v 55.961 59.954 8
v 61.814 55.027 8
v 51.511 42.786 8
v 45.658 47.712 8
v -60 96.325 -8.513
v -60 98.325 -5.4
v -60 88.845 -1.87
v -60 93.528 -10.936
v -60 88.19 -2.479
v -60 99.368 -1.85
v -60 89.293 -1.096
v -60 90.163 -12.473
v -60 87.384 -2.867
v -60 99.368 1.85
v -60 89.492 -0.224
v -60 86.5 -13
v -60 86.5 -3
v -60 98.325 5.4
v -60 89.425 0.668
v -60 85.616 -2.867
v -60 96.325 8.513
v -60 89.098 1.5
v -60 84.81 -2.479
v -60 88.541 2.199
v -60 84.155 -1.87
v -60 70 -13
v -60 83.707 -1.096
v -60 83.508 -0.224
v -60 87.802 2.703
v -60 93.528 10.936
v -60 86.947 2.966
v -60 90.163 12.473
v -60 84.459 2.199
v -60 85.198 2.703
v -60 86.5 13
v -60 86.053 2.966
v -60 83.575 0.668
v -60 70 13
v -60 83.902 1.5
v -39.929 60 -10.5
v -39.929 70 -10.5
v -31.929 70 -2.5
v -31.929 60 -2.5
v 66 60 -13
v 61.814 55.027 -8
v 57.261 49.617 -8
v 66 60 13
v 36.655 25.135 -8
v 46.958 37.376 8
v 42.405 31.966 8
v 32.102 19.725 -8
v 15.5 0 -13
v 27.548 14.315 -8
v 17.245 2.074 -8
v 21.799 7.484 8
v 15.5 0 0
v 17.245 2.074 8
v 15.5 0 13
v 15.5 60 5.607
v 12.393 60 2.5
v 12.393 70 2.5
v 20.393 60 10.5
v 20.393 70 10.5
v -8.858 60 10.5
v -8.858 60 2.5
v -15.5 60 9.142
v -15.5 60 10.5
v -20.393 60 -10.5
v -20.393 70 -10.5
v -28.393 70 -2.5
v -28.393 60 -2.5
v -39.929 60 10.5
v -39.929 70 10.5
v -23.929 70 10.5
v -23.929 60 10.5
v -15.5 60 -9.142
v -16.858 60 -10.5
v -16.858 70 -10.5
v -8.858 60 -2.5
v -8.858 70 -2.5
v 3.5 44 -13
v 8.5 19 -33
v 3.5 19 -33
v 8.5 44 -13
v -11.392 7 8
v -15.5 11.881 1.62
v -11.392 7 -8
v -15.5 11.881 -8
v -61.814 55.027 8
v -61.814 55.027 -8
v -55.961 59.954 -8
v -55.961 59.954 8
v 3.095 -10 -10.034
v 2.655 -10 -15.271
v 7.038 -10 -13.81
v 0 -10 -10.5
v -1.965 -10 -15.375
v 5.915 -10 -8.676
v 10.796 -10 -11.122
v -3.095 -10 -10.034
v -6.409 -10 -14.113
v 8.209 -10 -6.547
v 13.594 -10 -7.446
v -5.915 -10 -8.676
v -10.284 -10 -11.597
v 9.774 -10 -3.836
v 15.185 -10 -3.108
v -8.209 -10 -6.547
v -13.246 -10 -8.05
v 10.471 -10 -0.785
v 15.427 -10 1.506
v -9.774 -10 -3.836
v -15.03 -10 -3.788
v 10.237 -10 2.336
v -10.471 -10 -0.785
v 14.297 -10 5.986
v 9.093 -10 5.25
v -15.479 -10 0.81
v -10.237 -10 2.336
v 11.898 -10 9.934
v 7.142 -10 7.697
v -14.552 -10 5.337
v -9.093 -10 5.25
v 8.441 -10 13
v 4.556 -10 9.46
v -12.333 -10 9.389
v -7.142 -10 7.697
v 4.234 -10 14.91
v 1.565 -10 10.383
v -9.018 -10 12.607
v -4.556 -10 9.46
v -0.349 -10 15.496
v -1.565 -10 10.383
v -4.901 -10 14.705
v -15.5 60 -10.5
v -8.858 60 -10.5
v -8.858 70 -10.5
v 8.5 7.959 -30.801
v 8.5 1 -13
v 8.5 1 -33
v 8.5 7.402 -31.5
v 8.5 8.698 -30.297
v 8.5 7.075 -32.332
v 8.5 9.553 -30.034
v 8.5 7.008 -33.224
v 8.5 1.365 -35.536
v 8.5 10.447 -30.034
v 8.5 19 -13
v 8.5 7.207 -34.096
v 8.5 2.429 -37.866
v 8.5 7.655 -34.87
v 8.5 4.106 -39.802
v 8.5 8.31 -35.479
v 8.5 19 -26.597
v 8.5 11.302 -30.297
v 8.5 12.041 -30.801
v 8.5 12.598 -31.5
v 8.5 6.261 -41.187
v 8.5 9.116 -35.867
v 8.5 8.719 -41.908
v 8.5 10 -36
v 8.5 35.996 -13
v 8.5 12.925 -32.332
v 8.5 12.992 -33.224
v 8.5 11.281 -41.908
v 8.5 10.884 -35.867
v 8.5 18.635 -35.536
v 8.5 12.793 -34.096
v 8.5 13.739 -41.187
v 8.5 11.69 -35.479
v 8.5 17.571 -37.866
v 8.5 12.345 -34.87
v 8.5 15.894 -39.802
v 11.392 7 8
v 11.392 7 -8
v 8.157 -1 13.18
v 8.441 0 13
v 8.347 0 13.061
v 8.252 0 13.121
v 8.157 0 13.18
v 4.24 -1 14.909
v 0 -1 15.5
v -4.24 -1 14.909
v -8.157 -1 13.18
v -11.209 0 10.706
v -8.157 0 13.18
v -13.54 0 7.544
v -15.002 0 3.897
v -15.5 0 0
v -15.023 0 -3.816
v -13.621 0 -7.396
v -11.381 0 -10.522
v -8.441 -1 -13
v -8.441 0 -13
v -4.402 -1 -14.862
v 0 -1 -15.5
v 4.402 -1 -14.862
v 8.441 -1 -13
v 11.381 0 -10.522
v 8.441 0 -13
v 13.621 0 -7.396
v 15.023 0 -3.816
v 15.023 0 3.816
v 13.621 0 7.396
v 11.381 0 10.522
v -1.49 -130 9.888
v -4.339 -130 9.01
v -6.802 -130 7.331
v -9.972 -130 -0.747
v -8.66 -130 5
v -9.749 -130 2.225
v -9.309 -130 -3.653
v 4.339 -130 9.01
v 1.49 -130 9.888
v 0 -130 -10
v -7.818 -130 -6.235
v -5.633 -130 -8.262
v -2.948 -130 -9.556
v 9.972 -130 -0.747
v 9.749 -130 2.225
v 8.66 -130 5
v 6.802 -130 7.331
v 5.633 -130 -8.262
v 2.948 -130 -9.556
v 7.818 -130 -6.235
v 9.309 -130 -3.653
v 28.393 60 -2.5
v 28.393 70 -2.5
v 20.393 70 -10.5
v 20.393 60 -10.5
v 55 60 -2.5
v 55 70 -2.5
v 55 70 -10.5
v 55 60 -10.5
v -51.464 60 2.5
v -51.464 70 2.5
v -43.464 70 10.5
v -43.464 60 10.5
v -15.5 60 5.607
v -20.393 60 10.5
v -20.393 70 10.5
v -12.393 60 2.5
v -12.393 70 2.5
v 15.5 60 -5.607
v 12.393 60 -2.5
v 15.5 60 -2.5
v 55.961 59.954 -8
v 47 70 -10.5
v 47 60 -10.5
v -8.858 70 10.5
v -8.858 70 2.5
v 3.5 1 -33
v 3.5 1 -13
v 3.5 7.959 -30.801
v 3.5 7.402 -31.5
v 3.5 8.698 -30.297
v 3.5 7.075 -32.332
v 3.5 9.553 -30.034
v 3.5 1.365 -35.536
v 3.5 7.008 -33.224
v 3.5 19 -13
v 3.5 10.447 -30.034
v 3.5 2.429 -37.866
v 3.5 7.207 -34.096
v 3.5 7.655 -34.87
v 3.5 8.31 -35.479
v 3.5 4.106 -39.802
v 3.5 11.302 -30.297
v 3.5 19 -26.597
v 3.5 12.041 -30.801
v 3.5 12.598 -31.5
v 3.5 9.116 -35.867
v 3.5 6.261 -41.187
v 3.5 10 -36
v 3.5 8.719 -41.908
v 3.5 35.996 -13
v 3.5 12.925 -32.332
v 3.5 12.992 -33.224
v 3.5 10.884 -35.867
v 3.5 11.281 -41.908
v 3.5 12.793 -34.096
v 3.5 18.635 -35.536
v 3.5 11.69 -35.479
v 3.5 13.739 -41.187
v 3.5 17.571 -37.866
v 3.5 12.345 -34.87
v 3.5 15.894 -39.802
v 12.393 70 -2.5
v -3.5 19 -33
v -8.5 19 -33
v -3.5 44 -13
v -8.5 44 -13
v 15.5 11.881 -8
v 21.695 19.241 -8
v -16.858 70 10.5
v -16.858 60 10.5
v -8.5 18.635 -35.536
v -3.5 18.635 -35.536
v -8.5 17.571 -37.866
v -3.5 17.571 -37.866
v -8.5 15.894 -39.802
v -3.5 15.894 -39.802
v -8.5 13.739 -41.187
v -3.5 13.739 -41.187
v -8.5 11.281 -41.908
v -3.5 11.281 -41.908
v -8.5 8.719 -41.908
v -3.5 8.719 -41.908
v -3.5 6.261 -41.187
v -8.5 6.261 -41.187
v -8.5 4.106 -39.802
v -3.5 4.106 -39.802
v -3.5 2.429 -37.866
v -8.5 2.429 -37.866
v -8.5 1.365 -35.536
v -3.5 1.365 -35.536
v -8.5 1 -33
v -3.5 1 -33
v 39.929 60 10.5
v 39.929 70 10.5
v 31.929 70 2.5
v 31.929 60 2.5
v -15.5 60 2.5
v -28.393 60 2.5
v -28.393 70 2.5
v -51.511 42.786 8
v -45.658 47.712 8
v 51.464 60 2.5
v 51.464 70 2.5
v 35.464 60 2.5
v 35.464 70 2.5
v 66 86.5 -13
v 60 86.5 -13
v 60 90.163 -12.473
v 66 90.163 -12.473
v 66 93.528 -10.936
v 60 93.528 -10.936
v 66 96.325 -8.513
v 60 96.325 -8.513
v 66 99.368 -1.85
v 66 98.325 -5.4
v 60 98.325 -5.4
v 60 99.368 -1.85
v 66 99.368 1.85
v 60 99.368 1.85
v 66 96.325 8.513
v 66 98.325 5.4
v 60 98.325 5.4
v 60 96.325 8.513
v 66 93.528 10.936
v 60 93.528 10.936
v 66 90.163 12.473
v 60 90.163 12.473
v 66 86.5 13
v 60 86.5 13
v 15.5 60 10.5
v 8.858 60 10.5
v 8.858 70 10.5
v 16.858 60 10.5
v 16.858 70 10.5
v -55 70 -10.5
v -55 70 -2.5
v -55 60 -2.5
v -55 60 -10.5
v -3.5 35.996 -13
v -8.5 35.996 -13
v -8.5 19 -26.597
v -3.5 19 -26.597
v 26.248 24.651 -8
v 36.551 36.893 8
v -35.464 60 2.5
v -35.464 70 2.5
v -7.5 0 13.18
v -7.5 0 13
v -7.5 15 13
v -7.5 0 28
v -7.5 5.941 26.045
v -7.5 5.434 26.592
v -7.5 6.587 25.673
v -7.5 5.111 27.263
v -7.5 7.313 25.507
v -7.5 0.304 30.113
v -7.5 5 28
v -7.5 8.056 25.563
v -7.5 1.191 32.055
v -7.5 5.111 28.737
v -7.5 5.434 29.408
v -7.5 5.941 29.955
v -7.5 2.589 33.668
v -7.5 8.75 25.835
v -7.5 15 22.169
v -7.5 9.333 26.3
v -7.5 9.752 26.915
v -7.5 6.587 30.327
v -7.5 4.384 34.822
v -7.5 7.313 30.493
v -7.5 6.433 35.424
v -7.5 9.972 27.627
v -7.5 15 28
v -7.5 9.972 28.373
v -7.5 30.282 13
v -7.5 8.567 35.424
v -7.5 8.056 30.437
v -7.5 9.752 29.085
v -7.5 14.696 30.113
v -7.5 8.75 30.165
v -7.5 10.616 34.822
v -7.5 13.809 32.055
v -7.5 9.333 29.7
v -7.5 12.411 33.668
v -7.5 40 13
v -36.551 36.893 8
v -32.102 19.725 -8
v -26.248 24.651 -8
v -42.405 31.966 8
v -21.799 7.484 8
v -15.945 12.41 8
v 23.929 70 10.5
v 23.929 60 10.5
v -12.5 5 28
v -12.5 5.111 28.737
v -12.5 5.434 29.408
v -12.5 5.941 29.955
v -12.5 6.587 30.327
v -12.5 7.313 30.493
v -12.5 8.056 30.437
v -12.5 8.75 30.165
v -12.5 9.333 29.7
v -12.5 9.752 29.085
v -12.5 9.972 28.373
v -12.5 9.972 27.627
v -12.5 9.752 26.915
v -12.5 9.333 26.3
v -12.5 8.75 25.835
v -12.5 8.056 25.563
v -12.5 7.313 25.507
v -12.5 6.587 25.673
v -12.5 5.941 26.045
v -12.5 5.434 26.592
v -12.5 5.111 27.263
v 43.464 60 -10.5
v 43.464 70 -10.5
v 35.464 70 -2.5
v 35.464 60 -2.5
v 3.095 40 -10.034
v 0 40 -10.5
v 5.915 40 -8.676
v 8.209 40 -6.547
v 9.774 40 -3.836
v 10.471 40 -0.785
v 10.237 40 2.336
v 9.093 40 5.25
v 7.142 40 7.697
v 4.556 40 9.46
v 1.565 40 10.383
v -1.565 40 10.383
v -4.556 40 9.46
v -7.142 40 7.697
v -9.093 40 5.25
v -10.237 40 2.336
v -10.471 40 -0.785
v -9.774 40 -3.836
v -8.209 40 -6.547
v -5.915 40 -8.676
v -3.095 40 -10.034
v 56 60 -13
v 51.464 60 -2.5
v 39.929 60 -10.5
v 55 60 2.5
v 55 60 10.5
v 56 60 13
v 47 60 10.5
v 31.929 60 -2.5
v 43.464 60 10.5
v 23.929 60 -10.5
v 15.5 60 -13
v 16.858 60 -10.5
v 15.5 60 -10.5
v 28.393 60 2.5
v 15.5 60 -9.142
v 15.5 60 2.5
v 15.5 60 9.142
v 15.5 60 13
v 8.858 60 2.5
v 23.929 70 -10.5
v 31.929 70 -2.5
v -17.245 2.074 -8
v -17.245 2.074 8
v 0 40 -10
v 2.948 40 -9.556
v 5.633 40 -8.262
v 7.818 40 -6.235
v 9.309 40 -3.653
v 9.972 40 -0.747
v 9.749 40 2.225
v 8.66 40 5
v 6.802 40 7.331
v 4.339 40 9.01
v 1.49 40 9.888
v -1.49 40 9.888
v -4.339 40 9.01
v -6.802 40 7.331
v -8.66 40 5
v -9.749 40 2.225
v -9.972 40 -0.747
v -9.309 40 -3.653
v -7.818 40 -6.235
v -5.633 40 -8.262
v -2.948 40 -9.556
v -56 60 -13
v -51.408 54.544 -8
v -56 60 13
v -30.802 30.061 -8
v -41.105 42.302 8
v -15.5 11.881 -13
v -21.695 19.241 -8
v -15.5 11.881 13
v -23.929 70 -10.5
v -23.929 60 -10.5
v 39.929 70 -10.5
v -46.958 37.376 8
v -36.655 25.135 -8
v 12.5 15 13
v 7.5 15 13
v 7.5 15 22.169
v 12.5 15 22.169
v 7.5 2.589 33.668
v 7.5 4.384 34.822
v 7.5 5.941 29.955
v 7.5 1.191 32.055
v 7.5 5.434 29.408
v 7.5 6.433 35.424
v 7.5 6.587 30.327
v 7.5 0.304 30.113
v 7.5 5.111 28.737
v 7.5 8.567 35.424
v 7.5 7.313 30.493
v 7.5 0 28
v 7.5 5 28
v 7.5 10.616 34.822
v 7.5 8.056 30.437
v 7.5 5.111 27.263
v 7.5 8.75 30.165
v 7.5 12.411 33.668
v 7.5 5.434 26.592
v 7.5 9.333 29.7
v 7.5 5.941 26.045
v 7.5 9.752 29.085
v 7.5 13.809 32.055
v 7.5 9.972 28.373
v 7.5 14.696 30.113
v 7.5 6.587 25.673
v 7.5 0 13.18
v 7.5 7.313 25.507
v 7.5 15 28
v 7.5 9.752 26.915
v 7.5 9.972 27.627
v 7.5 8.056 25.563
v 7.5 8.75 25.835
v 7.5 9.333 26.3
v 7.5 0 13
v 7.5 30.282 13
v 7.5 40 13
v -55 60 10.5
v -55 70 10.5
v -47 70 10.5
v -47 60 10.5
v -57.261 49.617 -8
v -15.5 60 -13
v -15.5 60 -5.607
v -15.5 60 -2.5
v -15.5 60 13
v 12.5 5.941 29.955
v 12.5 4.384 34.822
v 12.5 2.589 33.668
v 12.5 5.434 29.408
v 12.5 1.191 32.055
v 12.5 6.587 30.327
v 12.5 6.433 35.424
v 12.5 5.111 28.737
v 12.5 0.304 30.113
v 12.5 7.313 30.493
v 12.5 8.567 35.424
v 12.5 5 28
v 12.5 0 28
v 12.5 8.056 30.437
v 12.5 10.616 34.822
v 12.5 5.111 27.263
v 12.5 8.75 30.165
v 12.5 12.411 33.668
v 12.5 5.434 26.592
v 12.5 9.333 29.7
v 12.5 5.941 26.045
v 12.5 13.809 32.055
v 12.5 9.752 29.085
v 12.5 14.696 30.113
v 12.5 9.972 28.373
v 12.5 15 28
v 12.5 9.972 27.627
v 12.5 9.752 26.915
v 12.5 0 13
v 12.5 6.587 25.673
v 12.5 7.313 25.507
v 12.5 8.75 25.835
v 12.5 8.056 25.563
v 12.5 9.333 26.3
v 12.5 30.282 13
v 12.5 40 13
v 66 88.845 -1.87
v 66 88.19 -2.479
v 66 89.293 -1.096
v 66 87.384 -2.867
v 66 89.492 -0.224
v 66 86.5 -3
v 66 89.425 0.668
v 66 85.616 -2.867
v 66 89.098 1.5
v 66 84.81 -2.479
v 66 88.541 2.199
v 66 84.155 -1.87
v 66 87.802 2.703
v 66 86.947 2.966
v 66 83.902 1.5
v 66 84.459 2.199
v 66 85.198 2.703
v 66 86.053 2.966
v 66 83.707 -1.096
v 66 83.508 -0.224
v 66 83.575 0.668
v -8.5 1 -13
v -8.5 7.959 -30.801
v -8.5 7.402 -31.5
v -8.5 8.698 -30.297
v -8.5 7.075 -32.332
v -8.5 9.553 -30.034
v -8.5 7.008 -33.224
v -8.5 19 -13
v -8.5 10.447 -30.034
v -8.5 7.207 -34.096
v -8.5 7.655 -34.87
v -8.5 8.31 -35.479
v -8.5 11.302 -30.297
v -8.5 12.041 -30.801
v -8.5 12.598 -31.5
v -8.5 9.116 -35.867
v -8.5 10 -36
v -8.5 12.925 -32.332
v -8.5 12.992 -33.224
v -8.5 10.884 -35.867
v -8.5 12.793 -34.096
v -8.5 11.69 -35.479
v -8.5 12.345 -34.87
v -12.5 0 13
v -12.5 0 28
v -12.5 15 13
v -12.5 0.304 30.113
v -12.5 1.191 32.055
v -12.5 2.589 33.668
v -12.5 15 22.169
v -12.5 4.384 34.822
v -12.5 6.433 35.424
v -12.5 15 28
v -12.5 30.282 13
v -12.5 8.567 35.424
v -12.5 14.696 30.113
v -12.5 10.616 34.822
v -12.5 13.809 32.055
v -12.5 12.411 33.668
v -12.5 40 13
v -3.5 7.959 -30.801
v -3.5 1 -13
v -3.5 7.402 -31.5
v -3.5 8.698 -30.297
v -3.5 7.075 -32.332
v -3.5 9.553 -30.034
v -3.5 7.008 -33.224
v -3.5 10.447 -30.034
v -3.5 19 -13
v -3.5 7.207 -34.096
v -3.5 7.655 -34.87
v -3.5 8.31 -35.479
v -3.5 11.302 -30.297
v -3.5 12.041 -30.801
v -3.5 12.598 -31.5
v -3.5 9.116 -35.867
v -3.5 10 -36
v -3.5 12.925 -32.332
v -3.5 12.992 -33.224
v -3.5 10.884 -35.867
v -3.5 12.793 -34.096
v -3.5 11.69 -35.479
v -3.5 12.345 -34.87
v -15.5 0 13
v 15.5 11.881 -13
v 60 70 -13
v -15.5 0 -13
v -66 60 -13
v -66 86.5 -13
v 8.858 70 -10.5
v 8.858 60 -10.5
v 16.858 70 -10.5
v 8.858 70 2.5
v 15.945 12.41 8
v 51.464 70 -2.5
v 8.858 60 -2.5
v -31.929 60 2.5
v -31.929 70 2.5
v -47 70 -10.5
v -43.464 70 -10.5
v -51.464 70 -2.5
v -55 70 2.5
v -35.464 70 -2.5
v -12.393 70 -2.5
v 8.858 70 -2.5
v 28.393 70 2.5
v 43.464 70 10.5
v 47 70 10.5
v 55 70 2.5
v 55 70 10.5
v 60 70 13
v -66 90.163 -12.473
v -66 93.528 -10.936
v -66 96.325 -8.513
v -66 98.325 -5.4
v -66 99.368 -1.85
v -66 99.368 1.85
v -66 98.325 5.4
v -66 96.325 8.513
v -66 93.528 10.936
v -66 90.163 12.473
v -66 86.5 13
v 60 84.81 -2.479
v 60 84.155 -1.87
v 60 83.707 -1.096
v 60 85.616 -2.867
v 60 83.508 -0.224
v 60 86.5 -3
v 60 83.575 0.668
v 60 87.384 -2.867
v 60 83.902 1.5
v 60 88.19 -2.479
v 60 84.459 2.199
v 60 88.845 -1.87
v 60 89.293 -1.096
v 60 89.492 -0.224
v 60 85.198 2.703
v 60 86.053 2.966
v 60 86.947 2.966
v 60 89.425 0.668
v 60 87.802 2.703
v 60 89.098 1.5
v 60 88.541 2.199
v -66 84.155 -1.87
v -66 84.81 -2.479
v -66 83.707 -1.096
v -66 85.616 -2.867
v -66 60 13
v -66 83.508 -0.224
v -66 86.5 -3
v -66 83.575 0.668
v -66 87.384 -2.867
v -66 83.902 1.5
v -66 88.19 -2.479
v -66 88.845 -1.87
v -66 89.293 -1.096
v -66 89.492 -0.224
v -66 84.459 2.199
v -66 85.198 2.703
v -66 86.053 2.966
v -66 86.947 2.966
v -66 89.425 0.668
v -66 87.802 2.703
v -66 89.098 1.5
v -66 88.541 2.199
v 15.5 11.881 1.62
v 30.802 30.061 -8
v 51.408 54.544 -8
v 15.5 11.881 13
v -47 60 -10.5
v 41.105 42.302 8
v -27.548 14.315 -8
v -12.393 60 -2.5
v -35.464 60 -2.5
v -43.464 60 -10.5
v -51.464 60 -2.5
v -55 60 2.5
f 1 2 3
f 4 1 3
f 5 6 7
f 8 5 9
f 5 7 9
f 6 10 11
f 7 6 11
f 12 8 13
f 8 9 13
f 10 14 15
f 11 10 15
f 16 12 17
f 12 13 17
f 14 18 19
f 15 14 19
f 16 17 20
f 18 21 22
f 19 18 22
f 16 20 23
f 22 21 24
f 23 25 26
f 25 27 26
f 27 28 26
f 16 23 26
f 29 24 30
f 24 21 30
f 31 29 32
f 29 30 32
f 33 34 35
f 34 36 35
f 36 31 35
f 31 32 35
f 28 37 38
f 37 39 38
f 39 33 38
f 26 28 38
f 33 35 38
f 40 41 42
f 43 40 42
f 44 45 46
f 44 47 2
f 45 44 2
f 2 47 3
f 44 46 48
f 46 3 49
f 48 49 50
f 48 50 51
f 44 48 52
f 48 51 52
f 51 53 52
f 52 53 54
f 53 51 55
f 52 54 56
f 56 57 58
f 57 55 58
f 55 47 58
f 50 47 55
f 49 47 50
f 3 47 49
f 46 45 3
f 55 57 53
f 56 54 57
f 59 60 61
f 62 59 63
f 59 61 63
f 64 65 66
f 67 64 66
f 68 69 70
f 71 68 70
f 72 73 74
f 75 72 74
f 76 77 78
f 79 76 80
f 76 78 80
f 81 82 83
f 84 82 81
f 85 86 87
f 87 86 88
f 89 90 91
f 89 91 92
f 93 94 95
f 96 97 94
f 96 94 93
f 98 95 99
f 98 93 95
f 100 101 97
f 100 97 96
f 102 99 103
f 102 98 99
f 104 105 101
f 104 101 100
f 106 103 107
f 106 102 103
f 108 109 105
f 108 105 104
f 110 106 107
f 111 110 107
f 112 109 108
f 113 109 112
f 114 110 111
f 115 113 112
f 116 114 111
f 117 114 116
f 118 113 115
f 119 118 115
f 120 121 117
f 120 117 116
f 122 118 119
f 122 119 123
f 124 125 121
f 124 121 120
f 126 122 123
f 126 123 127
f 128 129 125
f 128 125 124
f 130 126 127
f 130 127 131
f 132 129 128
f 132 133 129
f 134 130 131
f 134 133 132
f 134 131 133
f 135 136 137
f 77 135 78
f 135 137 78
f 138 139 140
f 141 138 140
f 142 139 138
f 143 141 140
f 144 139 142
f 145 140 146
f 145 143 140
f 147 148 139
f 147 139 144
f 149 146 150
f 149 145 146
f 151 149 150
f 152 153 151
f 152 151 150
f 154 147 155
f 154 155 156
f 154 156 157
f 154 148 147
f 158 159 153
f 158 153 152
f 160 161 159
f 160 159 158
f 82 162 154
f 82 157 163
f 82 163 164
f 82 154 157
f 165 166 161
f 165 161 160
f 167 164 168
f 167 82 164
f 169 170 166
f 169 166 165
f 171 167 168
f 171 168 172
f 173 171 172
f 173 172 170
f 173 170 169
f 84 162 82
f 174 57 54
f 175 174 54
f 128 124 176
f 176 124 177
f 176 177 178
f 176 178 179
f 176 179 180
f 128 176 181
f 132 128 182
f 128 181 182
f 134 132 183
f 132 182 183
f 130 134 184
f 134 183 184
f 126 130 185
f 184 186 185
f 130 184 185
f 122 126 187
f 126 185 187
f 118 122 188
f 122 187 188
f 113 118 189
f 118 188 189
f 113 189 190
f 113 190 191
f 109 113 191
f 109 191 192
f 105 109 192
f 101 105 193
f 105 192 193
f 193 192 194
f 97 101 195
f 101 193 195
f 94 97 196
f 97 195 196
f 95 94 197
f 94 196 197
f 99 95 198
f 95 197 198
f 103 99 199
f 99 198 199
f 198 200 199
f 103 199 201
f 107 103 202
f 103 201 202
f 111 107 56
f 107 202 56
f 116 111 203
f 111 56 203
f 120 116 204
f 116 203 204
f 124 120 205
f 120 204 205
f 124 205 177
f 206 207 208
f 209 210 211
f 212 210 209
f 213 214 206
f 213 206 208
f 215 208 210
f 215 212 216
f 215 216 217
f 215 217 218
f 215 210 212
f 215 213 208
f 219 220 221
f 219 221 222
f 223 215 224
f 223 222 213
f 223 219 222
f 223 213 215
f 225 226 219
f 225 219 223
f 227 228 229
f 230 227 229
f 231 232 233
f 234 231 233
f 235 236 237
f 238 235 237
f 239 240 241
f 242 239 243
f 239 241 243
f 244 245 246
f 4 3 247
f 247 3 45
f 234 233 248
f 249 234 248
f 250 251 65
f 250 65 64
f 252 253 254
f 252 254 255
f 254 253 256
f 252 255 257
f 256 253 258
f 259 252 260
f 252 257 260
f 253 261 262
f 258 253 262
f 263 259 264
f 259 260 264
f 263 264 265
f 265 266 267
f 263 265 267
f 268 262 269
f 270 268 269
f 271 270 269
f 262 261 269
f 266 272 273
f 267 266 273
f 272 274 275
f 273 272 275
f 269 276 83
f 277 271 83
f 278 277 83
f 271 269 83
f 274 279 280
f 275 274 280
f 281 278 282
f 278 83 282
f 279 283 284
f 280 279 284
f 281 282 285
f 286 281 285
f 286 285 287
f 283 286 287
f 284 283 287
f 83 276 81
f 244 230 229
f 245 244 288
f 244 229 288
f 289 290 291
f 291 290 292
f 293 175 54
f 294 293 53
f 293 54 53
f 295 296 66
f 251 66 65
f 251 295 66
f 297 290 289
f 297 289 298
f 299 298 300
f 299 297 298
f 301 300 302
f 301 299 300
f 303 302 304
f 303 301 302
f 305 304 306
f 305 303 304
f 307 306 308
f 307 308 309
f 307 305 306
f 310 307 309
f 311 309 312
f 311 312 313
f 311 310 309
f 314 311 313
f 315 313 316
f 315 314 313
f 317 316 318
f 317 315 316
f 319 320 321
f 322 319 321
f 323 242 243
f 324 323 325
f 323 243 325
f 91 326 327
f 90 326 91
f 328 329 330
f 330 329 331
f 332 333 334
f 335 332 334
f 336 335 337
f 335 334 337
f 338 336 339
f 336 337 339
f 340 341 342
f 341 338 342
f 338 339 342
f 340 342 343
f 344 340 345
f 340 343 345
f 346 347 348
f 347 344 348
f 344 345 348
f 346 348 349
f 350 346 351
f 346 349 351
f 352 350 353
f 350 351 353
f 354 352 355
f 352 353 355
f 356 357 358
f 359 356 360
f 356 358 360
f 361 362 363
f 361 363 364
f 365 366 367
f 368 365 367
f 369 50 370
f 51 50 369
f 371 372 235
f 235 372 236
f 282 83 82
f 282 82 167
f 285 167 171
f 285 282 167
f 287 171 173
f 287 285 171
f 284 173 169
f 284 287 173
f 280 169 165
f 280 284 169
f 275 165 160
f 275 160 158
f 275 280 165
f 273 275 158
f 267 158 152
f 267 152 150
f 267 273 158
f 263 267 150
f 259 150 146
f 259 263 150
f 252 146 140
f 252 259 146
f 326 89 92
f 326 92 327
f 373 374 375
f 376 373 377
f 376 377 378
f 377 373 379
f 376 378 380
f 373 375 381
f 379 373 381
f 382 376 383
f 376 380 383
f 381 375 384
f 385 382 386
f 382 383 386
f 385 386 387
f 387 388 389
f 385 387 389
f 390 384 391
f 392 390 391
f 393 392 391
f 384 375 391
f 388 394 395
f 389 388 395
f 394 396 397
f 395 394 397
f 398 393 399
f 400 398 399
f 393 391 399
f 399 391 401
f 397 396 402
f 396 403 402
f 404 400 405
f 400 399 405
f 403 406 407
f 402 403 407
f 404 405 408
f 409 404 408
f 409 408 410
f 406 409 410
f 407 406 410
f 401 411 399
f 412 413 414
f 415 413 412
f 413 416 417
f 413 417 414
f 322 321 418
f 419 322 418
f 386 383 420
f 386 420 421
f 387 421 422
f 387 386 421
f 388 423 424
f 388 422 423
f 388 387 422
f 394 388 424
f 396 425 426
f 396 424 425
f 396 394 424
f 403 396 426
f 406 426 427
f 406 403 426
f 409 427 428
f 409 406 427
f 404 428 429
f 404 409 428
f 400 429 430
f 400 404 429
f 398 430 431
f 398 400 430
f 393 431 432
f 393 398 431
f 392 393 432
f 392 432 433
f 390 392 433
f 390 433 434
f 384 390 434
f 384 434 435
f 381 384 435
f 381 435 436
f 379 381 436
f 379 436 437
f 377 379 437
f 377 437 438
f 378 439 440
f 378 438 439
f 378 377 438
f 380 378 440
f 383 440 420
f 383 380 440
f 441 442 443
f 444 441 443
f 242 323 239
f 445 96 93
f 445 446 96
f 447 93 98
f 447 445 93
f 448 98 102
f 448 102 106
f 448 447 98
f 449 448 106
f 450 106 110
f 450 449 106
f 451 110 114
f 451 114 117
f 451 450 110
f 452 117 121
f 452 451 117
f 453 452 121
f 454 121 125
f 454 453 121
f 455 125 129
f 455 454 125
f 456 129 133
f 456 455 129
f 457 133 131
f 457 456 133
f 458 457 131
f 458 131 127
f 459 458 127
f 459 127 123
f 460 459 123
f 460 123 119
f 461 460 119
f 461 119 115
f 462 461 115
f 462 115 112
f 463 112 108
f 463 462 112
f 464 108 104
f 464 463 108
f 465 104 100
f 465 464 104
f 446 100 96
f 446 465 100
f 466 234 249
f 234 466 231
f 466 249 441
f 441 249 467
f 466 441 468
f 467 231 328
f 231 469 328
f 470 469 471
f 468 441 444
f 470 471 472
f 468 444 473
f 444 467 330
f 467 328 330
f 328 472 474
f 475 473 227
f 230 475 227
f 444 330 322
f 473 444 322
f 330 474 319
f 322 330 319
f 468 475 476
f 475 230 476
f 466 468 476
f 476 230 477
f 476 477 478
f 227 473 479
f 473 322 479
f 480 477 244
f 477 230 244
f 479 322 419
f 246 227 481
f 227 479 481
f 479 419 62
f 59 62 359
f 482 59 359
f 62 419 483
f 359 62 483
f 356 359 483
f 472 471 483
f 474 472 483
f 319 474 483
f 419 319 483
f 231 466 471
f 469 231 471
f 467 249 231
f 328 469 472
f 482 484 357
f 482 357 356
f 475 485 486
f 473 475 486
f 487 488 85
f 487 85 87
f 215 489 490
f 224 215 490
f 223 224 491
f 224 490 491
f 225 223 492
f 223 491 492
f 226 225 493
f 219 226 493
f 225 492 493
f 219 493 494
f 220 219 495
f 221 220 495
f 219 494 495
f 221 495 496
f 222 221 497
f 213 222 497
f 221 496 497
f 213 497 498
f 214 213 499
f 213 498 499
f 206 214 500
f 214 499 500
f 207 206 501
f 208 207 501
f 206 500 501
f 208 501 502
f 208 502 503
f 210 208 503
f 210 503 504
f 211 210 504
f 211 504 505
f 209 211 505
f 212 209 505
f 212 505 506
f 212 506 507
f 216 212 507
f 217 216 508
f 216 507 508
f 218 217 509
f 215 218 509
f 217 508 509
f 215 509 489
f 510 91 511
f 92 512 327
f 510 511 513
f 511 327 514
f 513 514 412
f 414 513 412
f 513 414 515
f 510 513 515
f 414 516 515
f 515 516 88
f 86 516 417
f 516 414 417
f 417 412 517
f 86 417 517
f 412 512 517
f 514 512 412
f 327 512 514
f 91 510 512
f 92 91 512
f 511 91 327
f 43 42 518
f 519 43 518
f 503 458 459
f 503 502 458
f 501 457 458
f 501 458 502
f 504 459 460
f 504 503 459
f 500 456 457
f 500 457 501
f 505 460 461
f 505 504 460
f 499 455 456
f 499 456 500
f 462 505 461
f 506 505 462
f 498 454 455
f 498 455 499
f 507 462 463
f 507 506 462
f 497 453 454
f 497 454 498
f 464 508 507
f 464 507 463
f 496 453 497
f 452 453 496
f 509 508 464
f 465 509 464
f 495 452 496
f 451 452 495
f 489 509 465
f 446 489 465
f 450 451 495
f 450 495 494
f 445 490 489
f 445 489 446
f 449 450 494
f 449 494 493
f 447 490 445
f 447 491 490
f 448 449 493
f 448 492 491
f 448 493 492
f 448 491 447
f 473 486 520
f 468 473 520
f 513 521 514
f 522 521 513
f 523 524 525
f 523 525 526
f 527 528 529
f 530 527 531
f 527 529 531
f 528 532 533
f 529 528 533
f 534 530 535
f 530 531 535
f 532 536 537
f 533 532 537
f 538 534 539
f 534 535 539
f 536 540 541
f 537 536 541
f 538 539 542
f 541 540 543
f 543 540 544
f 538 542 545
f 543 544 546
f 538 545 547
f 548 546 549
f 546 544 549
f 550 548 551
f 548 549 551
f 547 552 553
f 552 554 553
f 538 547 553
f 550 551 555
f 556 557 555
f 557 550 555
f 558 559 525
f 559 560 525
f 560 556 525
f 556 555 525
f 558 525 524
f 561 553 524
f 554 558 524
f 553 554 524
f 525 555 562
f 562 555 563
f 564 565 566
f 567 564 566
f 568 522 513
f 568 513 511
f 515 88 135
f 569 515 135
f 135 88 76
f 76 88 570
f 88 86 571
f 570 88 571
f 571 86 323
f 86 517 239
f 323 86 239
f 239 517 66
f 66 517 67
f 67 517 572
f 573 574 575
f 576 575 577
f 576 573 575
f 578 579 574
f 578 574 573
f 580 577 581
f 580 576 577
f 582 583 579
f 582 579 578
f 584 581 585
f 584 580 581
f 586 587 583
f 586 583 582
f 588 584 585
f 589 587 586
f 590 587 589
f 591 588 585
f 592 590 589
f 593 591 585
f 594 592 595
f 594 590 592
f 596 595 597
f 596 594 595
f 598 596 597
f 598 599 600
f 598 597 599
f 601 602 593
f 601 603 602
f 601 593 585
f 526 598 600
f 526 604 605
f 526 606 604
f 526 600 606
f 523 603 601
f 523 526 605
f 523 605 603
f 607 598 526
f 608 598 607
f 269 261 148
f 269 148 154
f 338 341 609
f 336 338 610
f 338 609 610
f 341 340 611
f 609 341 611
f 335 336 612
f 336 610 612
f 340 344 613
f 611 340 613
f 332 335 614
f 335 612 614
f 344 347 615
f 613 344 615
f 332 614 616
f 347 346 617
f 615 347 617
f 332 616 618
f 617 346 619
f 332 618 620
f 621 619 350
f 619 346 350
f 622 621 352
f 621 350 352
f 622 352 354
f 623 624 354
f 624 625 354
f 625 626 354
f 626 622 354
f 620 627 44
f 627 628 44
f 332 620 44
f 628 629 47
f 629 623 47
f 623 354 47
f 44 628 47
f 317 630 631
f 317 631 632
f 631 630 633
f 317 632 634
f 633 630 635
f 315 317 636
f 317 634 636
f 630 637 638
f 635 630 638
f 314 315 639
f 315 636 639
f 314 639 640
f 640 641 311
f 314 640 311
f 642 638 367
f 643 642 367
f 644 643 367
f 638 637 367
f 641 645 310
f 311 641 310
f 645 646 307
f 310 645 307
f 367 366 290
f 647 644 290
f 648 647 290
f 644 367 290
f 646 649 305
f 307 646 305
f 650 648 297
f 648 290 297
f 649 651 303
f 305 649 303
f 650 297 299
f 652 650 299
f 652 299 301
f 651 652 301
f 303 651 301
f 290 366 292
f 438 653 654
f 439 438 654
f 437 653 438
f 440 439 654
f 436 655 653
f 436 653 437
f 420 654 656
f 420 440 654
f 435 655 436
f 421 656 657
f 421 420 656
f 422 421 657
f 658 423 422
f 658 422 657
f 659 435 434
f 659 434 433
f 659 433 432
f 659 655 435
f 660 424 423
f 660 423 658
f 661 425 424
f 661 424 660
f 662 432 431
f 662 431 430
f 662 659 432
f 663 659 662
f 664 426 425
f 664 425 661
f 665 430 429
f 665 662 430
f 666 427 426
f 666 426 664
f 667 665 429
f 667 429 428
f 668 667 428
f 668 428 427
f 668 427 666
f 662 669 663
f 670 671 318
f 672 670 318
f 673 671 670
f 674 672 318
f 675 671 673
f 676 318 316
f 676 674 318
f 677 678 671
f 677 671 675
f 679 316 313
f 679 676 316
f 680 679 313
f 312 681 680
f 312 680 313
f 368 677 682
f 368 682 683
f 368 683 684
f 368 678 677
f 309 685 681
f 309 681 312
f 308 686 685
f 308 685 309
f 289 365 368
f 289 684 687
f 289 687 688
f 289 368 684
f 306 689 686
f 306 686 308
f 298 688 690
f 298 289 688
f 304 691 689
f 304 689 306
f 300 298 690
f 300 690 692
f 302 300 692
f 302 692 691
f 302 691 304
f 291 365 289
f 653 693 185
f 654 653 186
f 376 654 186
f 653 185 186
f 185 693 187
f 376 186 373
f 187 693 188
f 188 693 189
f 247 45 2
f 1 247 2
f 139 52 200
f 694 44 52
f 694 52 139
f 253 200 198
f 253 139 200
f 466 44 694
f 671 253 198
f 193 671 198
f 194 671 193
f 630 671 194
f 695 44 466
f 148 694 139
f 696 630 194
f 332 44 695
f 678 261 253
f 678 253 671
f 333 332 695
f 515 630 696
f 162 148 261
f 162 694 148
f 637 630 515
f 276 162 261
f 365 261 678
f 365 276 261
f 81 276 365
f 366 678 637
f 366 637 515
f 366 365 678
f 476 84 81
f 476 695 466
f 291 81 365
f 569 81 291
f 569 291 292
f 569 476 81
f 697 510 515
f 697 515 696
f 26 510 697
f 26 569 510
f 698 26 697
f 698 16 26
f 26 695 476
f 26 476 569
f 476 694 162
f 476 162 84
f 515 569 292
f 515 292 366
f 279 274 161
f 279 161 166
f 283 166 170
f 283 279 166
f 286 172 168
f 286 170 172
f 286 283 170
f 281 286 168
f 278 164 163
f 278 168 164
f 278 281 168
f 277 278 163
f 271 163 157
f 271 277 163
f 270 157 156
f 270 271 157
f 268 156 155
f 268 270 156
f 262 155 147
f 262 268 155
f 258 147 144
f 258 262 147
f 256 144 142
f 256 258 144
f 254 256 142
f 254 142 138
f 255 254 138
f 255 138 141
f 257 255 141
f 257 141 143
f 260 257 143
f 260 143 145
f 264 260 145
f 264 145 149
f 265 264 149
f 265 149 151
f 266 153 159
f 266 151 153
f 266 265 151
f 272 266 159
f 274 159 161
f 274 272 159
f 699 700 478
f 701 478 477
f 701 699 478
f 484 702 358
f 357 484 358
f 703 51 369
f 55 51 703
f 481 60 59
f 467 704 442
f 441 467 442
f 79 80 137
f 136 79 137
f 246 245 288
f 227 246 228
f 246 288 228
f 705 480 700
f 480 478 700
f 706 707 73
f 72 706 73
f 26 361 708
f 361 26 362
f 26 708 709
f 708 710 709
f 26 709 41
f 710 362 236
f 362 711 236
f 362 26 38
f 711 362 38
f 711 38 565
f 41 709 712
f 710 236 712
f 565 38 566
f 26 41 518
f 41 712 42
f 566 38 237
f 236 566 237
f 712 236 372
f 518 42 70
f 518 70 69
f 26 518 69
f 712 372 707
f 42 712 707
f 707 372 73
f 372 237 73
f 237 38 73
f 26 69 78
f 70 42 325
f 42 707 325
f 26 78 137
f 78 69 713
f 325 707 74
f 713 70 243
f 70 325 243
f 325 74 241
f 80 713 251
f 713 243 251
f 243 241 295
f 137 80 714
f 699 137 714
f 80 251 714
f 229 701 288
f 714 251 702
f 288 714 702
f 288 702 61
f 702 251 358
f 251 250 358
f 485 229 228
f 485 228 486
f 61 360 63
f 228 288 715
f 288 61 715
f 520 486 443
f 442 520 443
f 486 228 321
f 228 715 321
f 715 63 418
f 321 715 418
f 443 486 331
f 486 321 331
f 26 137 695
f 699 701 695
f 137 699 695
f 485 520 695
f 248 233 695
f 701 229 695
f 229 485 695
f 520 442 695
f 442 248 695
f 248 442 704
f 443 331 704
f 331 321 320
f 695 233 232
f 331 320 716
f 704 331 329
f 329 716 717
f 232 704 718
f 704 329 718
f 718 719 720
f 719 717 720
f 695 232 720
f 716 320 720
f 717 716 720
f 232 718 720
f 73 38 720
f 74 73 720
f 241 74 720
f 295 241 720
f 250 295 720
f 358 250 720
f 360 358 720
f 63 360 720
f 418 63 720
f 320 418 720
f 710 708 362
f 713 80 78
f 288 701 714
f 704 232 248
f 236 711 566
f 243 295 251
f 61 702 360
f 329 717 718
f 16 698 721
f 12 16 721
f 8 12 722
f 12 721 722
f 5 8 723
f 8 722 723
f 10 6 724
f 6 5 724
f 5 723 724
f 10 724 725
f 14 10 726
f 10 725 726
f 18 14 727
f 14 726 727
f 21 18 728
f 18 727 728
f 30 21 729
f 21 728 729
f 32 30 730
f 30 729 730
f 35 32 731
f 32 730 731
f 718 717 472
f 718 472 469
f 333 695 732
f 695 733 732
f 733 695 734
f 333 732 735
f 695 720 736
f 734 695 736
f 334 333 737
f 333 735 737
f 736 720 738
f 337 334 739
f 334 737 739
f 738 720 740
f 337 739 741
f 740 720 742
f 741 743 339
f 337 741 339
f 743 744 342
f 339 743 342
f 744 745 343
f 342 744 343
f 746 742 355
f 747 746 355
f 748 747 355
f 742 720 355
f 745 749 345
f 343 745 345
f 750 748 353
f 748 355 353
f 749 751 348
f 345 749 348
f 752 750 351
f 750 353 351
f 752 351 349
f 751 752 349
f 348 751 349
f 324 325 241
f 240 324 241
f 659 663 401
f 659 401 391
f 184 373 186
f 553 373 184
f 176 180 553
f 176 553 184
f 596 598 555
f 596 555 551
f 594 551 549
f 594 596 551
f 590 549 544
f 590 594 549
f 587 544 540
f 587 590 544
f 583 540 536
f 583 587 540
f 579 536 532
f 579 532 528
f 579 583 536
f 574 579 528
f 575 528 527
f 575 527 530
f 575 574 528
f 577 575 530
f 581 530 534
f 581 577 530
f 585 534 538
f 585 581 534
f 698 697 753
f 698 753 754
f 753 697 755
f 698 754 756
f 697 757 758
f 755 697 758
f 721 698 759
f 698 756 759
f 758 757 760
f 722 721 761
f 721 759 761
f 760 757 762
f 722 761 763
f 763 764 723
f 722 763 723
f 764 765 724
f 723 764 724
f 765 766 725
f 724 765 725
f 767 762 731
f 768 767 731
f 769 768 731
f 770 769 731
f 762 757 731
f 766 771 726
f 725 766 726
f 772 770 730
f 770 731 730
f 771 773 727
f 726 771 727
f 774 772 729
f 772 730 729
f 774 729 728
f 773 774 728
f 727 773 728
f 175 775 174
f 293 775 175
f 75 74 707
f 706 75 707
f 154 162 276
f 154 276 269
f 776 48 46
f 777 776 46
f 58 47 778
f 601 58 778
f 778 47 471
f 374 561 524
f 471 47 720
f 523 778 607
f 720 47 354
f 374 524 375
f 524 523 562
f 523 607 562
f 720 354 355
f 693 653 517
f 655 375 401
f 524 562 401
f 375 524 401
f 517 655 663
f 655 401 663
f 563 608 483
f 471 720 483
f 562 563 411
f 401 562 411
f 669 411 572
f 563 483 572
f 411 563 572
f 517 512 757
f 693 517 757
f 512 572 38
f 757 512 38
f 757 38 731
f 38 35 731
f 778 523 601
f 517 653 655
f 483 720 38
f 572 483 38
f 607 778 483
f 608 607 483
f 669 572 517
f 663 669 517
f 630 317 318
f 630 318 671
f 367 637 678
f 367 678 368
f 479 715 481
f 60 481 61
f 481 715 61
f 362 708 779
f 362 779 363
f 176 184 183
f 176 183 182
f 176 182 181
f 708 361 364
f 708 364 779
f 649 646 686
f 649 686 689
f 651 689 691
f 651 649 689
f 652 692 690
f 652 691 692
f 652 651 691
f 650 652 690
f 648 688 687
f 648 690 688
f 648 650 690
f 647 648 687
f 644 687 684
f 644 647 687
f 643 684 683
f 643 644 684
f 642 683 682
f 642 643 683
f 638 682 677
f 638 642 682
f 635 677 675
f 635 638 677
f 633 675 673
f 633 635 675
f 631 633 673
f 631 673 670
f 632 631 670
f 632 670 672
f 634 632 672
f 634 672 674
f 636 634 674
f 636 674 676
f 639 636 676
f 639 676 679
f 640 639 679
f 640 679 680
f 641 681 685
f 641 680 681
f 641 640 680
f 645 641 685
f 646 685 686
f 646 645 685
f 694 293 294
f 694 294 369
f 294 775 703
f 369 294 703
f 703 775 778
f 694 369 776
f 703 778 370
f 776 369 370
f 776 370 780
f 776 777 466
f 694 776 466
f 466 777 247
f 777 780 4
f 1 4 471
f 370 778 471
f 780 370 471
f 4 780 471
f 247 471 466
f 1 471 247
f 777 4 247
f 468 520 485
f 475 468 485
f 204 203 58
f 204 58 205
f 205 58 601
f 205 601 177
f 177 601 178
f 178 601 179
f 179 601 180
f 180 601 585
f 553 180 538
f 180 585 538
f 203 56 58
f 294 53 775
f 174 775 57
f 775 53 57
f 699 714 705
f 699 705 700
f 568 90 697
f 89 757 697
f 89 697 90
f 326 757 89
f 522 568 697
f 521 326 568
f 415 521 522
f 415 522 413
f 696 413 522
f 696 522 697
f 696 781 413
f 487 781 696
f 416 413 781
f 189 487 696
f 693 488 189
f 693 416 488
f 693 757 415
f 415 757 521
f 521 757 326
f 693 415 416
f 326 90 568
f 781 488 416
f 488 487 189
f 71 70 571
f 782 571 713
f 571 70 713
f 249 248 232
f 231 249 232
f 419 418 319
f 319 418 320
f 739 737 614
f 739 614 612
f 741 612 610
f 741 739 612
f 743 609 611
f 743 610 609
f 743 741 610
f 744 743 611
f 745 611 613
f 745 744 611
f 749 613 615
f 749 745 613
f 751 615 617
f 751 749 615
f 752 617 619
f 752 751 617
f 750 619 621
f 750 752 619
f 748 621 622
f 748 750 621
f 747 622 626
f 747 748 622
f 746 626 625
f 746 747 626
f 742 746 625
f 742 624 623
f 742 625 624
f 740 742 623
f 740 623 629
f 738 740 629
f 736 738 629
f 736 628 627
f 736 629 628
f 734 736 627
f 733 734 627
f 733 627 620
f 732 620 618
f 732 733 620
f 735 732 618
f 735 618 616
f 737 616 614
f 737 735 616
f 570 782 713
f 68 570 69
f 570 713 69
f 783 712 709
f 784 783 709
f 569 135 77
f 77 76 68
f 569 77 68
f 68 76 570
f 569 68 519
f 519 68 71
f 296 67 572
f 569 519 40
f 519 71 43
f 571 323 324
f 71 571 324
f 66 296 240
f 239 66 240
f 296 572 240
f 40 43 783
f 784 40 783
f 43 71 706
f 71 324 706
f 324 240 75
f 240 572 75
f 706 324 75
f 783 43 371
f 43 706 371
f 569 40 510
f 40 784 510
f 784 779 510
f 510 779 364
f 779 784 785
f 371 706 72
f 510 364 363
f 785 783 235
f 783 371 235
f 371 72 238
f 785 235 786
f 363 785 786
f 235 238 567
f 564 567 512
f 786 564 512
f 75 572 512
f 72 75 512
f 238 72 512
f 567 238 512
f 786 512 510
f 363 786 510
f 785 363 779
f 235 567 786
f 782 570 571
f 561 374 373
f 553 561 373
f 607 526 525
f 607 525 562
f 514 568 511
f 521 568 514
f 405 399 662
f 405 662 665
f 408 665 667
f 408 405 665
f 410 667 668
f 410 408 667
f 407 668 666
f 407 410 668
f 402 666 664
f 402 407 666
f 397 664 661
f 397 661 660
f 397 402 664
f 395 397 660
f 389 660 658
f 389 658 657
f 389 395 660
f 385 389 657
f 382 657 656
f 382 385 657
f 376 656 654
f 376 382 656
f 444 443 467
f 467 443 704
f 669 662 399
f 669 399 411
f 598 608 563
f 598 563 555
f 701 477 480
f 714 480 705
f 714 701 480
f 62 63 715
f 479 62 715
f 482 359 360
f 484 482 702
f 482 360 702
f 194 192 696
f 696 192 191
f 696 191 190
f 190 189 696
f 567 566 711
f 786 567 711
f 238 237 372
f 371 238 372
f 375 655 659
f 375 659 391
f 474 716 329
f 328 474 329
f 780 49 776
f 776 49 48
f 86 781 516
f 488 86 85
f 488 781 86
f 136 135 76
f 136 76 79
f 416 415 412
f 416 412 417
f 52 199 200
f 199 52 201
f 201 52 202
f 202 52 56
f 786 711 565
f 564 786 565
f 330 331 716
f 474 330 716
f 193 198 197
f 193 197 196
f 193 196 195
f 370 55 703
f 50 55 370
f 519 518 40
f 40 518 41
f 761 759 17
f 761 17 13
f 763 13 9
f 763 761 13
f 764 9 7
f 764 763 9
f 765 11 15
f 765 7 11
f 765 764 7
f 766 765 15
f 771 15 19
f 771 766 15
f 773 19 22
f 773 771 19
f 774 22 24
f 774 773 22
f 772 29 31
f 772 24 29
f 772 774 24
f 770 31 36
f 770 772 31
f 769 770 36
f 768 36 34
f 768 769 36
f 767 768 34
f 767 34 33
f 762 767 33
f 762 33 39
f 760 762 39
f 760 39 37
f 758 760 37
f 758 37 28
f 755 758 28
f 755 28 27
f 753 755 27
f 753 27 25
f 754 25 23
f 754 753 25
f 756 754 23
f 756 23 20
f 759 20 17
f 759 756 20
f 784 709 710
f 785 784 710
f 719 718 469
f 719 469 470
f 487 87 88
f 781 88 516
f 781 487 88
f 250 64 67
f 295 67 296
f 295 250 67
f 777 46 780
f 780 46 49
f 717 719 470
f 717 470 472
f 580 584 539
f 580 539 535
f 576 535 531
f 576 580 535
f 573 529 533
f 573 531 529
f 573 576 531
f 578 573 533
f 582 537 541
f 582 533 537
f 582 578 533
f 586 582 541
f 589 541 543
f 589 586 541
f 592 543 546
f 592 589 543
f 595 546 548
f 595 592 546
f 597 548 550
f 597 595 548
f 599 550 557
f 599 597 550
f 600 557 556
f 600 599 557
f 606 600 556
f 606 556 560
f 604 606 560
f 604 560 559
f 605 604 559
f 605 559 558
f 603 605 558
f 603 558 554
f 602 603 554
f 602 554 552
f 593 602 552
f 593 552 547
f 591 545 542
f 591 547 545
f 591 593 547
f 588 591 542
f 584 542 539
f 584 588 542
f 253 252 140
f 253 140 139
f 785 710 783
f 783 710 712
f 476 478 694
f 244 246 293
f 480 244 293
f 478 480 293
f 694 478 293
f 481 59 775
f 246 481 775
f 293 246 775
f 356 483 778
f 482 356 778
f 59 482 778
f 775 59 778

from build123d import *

# Parameters (mm, degrees)
TYKKELSE_LEDDFESTER_OG_BREDDE_H_YDE_SELV_DEPTH = 13
SKETCH28_R                                     = 15.5
SKETCH28_R_2                                   = 10.5
HULL_TIL_L_RBEN_KARBONFIBERR_R_DEPTH           = 10
SKRUEHULL_LEDDFESTER_DEPTH                     = 167.325734629
SKRUEHULL_LEDDFESTER_DEPTH_BACK                = 167.325734629
SKETCH29_R                                     = 3
SKETCH33_W                                     = 5
SKETCH33_H                                     = 20
BREDDE_OG_AVSTAND_STEMPELENDE_DEPTH            = 60
CUT_EXTRUDE4_DEPTH                             = 148.147035308
SIDEM_NSTER_DEPTH                              = 7.650765
SIDEM_NSTER_2_DEPTH                            = 7.650765
UTVIDET_START                                  = -40
SKETCH44_R                                     = 10.5
UTVIDET_L_RBENHULL_INN_I_SELVE_KROPPEN_DEPTH   = 40
M_NSTER_TOPP_DEPTH                             = 10
STEMPELENDE_AV_ST_RSTE_SYLINDER_DEPTH          = 145.150962536
STEMPELENDE_AV_ST_RSTE_SYLINDER_DEPTH_BACK     = 145.150962536
ROD_ENDE_JUSTERE_LENGDEN_ALTS_FESTE_T_R        = 3
SKETCH39_W                                     = 5
SKETCH39_H                                     = 15
SYLINDERFESTE_SELVE_DEN_LILLE_SYLINDERE_DEPTH  = 25
ST_TTER_ST_RSTE_SYLINDER_1_DEPTH               = 5
ST_TTER_ST_RSTE_SYLINDER_2_DEPTH               = 5
SYLINDERFESTE_LITEN_SYLINDER_DEPTH             = 134.515916654
SYLINDERFESTE_LITEN_SYLINDER_DEPTH_BACK        = 134.515916654
SKETCH48_R                                     = 2.5
BOSS_EXTRUDE11_DEPTH                           = 5
BOSS_EXTRUDE12_DEPTH                           = 5
SKETCH51_R                                     = 10
TIL_ASSEMBLY_SLETT_F_R_PRINTING_DEPTH          = 170


with BuildPart() as part:
    # Sketch27 → Tykkelse leddfester og bredde/høyde selve modellen (new, symmetric)
    with BuildSketch(Plane.XY):
        Polygon((66, 0), (-66, 0), (-66, 100), (-60, 100), (-60, 70), (60, 70), (60, 100), (66, 100), align=None)
    extrude(amount=TYKKELSE_LEDDFESTER_OG_BREDDE_H_YDE_SELV_DEPTH, both=True)

    # Sketch28 → Hull til lårben/karbonfiberrør (add)
    with BuildSketch(Plane.XZ):
        with Locations(Location((0, 0, 0), (0, 0, 57.004114526))):
            Circle(SKETCH28_R)
        with Locations(Location((0, 0, 0), (0, 0, 270))):
            Circle(SKETCH28_R_2, mode=Mode.SUBTRACT)
    extrude(amount=HULL_TIL_L_RBEN_KARBONFIBERR_R_DEPTH)

    # Sketch29 → Skruehull leddfester (cut, two sides: drawn at the far end of the back side and taken through both)
    with BuildSketch(Plane(origin=(66, 0, 0), x_dir=(0, 0, -1), z_dir=(1, 0, 0)).offset(-SKRUEHULL_LEDDFESTER_DEPTH_BACK)):
        with Locations((0, 86.5)):
            Circle(SKETCH29_R)
        with BuildLine():
            Line((-13, 86.5), (-13, 71.5))
            Line((-13, 71.5), (-14, 71.5))
            Line((-14, 71.5), (-14, 101))
            Line((-14, 101), (0, 101))
            Line((0, 101), (14, 101))
            Line((14, 101), (14, 71.5))
            Line((14, 71.5), (13, 71.5))
            Line((13, 71.5), (13, 86.5))
            ThreePointArc((13, 86.5), (0, 99.5), (-13, 86.5))
        make_face()
    extrude(amount=SKRUEHULL_LEDDFESTER_DEPTH + SKRUEHULL_LEDDFESTER_DEPTH_BACK, mode=Mode.SUBTRACT)

    # Sketch33 → Bredde og avstand stempelende (add)
    with BuildSketch(Plane(origin=(0, 0, -13), x_dir=(-1, 0, 0), z_dir=(0, 0, -1))):
        with Locations((-6, 10)):
            Rectangle(SKETCH33_W, SKETCH33_H)
        with Locations((6, 10)):
            Rectangle(SKETCH33_W, SKETCH33_H)
    extrude(amount=BREDDE_OG_AVSTAND_STEMPELENDE_DEPTH)

    # Fasong (mønster på selve kroppen) → Cut-Extrude4 (cut, through all)
    with BuildSketch(Plane.XY.offset(13)):
        Polygon((-66, 60), (-15.5, 0), (-66, 0), align=None)
        Polygon((15.5, 0), (66, 0), (66, 60), align=None)
        Polygon((-56, 60), (-15.5, 11.881188119), (-15.5, 60), align=None)
        Polygon((56, 60), (15.5, 60), (15.5, 11.881188119), align=None)
    extrude(amount=-CUT_EXTRUDE4_DEPTH, mode=Mode.SUBTRACT)

    # Sketch40 → Sidemønster (cut)
    with BuildSketch(Plane(origin=(-9.072801919, -7.636274948, 0), x_dir=(0, 0, 1), z_dir=(-0.765076505498557, -0.6439393921279521, 0))):
        Polygon((-8, 81.90459021), (8, 81.90459021), (8, 65.90459021), align=None)
        Polygon((-8, 74.833522398), (8, 58.833522398), (-8, 42.833522398), align=None)
        Polygon((8, 19.762454587), (-8, 35.762454587), (8, 51.762454587), align=None)
        Polygon((-8, 28.691386775), (8, 12.691386775), (-8, 12.691386775), align=None)
    extrude(amount=-SIDEM_NSTER_DEPTH, mode=Mode.SUBTRACT)

    # Sketch42 → Sidemønster 2 (cut)
    with BuildSketch(Plane(origin=(9.072801919, -7.636274948, 0), x_dir=(0, 0, -1), z_dir=(0.765076505498557, -0.6439393921279521, 0))):
        Polygon((8, 81.90459021), (-8, 81.90459021), (-8, 65.90459021), align=None)
        Polygon((8, 74.833522398), (-8, 58.833522398), (8, 42.833522398), align=None)
        Polygon((-8, 51.762454587), (8, 35.762454587), (-8, 19.762454587), align=None)
        Polygon((8, 28.691386775), (-8, 12.691386775), (8, 12.691386775), align=None)
    extrude(amount=-SIDEM_NSTER_2_DEPTH, mode=Mode.SUBTRACT)

    # Sketch44 → Utvidet lårbenhull inn i selve kroppen (cut)
    with BuildSketch(Plane.XZ.offset(UTVIDET_START)):
        with Locations(Location((0, 0, 0), (0, 0, 270))):
            Circle(SKETCH44_R)
    extrude(amount=UTVIDET_L_RBENHULL_INN_I_SELVE_KROPPEN_DEPTH, mode=Mode.SUBTRACT)

    # Sketch45 → Mønster topp (cut)
    with BuildSketch(Plane(origin=(0, 70, 0), x_dir=(1, 0, 0), z_dir=(0, 1, 0))):
        Polygon((-39.928932188, 10.5), (-31.928932188, 2.5), (-23.928932188, 10.5), align=None)
        Polygon((-16.857864376, 10.5), (-8.857864376, 2.5), (-8.857864376, 10.5), align=None)
        Polygon((-55, 2.5), (-55, 10.5), (-47, 10.5), align=None)
        Polygon((-43.464466094, 10.5), (-51.464466094, 2.5), (-35.464466094, 2.5), align=None)
        Polygon((-20.393398282, 10.5), (-28.393398282, 2.5), (-12.393398282, 2.5), align=None)
        Polygon((-8.857864376, -2.5), (-8.857864376, -10.5), (-16.857864376, -10.5), align=None)
        Polygon((-20.393398282, -10.5), (-12.393398282, -2.5), (-28.393398282, -2.5), align=None)
        Polygon((-23.928932188, -10.5), (-31.928932188, -2.5), (-39.928932188, -10.5), align=None)
        Polygon((-43.464466094, -10.5), (-35.464466094, -2.5), (-51.464466094, -2.5), align=None)
        Polygon((-55, -10.5), (-47, -10.5), (-55, -2.5), align=None)
        Polygon((8.857864376, 2.5), (8.857864376, 10.5), (16.857864376, 10.5), align=None)
        Polygon((16.857864376, -10.5), (8.857864376, -2.5), (8.857864376, -10.5), align=None)
        Polygon((20.393398282, -10.5), (28.393398282, -2.5), (12.393398282, -2.5), align=None)
        Polygon((20.393398282, 10.5), (12.393398282, 2.5), (28.393398282, 2.5), align=None)
        Polygon((23.928932188, 10.5), (31.928932188, 2.5), (39.928932188, 10.5), align=None)
        Polygon((23.928932188, -10.5), (39.928932188, -10.5), (31.928932188, -2.5), align=None)
        Polygon((43.464466094, -10.5), (51.464466094, -2.5), (35.464466094, -2.5), align=None)
        Polygon((55, -2.5), (55, -10.5), (47, -10.5), align=None)
        Polygon((43.464466094, 10.5), (35.464466094, 2.5), (51.464466094, 2.5), align=None)
        Polygon((55, 10.5), (47, 10.5), (55, 2.5), align=None)
    extrude(amount=-M_NSTER_TOPP_DEPTH, mode=Mode.SUBTRACT)

    # Rod-ende, justere lengden (altså feste til største sylinder) → Stempelende av st_rste sylinder (cut, two sides: drawn at the far end of the back side and taken through both)
    with BuildSketch(Plane(origin=(8.5, 0, 0), x_dir=(0, 0, -1), z_dir=(1, 0, 0)).offset(-STEMPELENDE_AV_ST_RSTE_SYLINDER_DEPTH_BACK)):
        with Locations((33, 10)):
            Circle(ROD_ENDE_JUSTERE_LENGDEN_ALTS_FESTE_T_R)
        with BuildLine():
            Line((43, -1), (74, -1))
            Line((74, -1), (74, 21))
            Line((74, 21), (43, 21))
            Line((43, 21), (13, 21))
            Line((13, 21), (13, 19))
            Line((13, 19), (33, 19))
            ThreePointArc((33, 19), (42, 10), (33, 1))
            Line((33, 1), (13, 1))
            Line((13, 1), (13, -1))
            Line((13, -1), (43, -1))
        make_face()
    extrude(amount=STEMPELENDE_AV_ST_RSTE_SYLINDER_DEPTH + STEMPELENDE_AV_ST_RSTE_SYLINDER_DEPTH_BACK, mode=Mode.SUBTRACT)

    # Sketch39 → Sylinderfeste_ selve den lille sylindere (add)
    with BuildSketch(Plane.XY.offset(13)):
        with Locations((-10, 7.5)):
            Rectangle(SKETCH39_W, SKETCH39_H)
        with Locations((10, 7.5)):
            Rectangle(SKETCH39_W, SKETCH39_H)
    extrude(amount=SYLINDERFESTE_SELVE_DEN_LILLE_SYLINDERE_DEPTH)

    # Sketch46 → Støtter største sylinder 1 (add)
    with BuildSketch(Plane(origin=(8.5, 0, 0), x_dir=(0, 0, -1), z_dir=(1, 0, 0))):
        Polygon((13, 44), (13, 35.996094703), (26.596875763, 19), (33, 19), align=None)
    extrude(amount=-ST_TTER_ST_RSTE_SYLINDER_1_DEPTH)

    # Sketch47 → Støtter største sylinder 2 (add)
    with BuildSketch(Plane.ZY.offset(8.5)):
        Polygon((-33, 19), (-13, 44), (-13, 35.996094703), (-26.596875763, 19), align=None)
    extrude(amount=-ST_TTER_ST_RSTE_SYLINDER_2_DEPTH)

    # Sketch48 → Sylinderfeste, liten sylinder (cut, two sides: drawn at the far end of the back side and taken through both)
    with BuildSketch(Plane.ZY.offset(12.5).offset(-SYLINDERFESTE_LITEN_SYLINDER_DEPTH_BACK)):
        with Locations(Location((28, 7.5, 0), (0, 0, 270))):
            Circle(SKETCH48_R)
        with BuildLine():
            Line((28, 0), (13.179811187, 0))
            Line((13.179811187, 0), (13.179811187, -1))
            Line((13.179811187, -1), (39, -1))
            Line((39, -1), (39, 16))
            Line((39, 16), (13, 16))
            Line((13, 16), (13, 15))
            Line((13, 15), (28, 15))
            ThreePointArc((28, 15), (35.5, 7.5), (28, 0))
        make_face()
    extrude(amount=SYLINDERFESTE_LITEN_SYLINDER_DEPTH + SYLINDERFESTE_LITEN_SYLINDER_DEPTH_BACK, mode=Mode.SUBTRACT)

    # Sketch49 → Boss-Extrude11 (add)
    with BuildSketch(Plane.ZY.offset(12.5)):
        Polygon((28, 15), (13, 40), (13, 30.281746842), (22.169048105, 15), align=None)
    extrude(amount=-BOSS_EXTRUDE11_DEPTH)

    # Sketch50 → Boss-Extrude12 (add)
    with BuildSketch(Plane(origin=(12.5, 0, 0), x_dir=(0, 0, -1), z_dir=(1, 0, 0))):
        Polygon((-28, 15), (-22.169048105, 15), (-13, 30.281746842), (-13, 40), align=None)
    extrude(amount=-BOSS_EXTRUDE12_DEPTH)

    # Sketch51 → TIL ASSEMBLY - SLETT FØR PRINTING (add)
    with BuildSketch(Plane.XZ.offset(-40)):
        with Locations(Location((0, 0, 0), (0, 0, 270))):
            Circle(SKETCH51_R)
    extrude(amount=TIL_ASSEMBLY_SLETT_F_R_PRINTING_DEPTH)


solid = part.part
